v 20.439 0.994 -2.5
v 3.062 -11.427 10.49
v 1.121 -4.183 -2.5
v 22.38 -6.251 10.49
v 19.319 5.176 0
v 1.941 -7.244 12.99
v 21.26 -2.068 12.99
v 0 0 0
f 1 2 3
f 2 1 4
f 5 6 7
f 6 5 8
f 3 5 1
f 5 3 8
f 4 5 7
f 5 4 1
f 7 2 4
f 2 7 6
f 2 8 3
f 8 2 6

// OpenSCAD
// Generated by generate_scads.py
rotate([120,0,15]) {
  cube(size=[20,15,5], center=false);
}
